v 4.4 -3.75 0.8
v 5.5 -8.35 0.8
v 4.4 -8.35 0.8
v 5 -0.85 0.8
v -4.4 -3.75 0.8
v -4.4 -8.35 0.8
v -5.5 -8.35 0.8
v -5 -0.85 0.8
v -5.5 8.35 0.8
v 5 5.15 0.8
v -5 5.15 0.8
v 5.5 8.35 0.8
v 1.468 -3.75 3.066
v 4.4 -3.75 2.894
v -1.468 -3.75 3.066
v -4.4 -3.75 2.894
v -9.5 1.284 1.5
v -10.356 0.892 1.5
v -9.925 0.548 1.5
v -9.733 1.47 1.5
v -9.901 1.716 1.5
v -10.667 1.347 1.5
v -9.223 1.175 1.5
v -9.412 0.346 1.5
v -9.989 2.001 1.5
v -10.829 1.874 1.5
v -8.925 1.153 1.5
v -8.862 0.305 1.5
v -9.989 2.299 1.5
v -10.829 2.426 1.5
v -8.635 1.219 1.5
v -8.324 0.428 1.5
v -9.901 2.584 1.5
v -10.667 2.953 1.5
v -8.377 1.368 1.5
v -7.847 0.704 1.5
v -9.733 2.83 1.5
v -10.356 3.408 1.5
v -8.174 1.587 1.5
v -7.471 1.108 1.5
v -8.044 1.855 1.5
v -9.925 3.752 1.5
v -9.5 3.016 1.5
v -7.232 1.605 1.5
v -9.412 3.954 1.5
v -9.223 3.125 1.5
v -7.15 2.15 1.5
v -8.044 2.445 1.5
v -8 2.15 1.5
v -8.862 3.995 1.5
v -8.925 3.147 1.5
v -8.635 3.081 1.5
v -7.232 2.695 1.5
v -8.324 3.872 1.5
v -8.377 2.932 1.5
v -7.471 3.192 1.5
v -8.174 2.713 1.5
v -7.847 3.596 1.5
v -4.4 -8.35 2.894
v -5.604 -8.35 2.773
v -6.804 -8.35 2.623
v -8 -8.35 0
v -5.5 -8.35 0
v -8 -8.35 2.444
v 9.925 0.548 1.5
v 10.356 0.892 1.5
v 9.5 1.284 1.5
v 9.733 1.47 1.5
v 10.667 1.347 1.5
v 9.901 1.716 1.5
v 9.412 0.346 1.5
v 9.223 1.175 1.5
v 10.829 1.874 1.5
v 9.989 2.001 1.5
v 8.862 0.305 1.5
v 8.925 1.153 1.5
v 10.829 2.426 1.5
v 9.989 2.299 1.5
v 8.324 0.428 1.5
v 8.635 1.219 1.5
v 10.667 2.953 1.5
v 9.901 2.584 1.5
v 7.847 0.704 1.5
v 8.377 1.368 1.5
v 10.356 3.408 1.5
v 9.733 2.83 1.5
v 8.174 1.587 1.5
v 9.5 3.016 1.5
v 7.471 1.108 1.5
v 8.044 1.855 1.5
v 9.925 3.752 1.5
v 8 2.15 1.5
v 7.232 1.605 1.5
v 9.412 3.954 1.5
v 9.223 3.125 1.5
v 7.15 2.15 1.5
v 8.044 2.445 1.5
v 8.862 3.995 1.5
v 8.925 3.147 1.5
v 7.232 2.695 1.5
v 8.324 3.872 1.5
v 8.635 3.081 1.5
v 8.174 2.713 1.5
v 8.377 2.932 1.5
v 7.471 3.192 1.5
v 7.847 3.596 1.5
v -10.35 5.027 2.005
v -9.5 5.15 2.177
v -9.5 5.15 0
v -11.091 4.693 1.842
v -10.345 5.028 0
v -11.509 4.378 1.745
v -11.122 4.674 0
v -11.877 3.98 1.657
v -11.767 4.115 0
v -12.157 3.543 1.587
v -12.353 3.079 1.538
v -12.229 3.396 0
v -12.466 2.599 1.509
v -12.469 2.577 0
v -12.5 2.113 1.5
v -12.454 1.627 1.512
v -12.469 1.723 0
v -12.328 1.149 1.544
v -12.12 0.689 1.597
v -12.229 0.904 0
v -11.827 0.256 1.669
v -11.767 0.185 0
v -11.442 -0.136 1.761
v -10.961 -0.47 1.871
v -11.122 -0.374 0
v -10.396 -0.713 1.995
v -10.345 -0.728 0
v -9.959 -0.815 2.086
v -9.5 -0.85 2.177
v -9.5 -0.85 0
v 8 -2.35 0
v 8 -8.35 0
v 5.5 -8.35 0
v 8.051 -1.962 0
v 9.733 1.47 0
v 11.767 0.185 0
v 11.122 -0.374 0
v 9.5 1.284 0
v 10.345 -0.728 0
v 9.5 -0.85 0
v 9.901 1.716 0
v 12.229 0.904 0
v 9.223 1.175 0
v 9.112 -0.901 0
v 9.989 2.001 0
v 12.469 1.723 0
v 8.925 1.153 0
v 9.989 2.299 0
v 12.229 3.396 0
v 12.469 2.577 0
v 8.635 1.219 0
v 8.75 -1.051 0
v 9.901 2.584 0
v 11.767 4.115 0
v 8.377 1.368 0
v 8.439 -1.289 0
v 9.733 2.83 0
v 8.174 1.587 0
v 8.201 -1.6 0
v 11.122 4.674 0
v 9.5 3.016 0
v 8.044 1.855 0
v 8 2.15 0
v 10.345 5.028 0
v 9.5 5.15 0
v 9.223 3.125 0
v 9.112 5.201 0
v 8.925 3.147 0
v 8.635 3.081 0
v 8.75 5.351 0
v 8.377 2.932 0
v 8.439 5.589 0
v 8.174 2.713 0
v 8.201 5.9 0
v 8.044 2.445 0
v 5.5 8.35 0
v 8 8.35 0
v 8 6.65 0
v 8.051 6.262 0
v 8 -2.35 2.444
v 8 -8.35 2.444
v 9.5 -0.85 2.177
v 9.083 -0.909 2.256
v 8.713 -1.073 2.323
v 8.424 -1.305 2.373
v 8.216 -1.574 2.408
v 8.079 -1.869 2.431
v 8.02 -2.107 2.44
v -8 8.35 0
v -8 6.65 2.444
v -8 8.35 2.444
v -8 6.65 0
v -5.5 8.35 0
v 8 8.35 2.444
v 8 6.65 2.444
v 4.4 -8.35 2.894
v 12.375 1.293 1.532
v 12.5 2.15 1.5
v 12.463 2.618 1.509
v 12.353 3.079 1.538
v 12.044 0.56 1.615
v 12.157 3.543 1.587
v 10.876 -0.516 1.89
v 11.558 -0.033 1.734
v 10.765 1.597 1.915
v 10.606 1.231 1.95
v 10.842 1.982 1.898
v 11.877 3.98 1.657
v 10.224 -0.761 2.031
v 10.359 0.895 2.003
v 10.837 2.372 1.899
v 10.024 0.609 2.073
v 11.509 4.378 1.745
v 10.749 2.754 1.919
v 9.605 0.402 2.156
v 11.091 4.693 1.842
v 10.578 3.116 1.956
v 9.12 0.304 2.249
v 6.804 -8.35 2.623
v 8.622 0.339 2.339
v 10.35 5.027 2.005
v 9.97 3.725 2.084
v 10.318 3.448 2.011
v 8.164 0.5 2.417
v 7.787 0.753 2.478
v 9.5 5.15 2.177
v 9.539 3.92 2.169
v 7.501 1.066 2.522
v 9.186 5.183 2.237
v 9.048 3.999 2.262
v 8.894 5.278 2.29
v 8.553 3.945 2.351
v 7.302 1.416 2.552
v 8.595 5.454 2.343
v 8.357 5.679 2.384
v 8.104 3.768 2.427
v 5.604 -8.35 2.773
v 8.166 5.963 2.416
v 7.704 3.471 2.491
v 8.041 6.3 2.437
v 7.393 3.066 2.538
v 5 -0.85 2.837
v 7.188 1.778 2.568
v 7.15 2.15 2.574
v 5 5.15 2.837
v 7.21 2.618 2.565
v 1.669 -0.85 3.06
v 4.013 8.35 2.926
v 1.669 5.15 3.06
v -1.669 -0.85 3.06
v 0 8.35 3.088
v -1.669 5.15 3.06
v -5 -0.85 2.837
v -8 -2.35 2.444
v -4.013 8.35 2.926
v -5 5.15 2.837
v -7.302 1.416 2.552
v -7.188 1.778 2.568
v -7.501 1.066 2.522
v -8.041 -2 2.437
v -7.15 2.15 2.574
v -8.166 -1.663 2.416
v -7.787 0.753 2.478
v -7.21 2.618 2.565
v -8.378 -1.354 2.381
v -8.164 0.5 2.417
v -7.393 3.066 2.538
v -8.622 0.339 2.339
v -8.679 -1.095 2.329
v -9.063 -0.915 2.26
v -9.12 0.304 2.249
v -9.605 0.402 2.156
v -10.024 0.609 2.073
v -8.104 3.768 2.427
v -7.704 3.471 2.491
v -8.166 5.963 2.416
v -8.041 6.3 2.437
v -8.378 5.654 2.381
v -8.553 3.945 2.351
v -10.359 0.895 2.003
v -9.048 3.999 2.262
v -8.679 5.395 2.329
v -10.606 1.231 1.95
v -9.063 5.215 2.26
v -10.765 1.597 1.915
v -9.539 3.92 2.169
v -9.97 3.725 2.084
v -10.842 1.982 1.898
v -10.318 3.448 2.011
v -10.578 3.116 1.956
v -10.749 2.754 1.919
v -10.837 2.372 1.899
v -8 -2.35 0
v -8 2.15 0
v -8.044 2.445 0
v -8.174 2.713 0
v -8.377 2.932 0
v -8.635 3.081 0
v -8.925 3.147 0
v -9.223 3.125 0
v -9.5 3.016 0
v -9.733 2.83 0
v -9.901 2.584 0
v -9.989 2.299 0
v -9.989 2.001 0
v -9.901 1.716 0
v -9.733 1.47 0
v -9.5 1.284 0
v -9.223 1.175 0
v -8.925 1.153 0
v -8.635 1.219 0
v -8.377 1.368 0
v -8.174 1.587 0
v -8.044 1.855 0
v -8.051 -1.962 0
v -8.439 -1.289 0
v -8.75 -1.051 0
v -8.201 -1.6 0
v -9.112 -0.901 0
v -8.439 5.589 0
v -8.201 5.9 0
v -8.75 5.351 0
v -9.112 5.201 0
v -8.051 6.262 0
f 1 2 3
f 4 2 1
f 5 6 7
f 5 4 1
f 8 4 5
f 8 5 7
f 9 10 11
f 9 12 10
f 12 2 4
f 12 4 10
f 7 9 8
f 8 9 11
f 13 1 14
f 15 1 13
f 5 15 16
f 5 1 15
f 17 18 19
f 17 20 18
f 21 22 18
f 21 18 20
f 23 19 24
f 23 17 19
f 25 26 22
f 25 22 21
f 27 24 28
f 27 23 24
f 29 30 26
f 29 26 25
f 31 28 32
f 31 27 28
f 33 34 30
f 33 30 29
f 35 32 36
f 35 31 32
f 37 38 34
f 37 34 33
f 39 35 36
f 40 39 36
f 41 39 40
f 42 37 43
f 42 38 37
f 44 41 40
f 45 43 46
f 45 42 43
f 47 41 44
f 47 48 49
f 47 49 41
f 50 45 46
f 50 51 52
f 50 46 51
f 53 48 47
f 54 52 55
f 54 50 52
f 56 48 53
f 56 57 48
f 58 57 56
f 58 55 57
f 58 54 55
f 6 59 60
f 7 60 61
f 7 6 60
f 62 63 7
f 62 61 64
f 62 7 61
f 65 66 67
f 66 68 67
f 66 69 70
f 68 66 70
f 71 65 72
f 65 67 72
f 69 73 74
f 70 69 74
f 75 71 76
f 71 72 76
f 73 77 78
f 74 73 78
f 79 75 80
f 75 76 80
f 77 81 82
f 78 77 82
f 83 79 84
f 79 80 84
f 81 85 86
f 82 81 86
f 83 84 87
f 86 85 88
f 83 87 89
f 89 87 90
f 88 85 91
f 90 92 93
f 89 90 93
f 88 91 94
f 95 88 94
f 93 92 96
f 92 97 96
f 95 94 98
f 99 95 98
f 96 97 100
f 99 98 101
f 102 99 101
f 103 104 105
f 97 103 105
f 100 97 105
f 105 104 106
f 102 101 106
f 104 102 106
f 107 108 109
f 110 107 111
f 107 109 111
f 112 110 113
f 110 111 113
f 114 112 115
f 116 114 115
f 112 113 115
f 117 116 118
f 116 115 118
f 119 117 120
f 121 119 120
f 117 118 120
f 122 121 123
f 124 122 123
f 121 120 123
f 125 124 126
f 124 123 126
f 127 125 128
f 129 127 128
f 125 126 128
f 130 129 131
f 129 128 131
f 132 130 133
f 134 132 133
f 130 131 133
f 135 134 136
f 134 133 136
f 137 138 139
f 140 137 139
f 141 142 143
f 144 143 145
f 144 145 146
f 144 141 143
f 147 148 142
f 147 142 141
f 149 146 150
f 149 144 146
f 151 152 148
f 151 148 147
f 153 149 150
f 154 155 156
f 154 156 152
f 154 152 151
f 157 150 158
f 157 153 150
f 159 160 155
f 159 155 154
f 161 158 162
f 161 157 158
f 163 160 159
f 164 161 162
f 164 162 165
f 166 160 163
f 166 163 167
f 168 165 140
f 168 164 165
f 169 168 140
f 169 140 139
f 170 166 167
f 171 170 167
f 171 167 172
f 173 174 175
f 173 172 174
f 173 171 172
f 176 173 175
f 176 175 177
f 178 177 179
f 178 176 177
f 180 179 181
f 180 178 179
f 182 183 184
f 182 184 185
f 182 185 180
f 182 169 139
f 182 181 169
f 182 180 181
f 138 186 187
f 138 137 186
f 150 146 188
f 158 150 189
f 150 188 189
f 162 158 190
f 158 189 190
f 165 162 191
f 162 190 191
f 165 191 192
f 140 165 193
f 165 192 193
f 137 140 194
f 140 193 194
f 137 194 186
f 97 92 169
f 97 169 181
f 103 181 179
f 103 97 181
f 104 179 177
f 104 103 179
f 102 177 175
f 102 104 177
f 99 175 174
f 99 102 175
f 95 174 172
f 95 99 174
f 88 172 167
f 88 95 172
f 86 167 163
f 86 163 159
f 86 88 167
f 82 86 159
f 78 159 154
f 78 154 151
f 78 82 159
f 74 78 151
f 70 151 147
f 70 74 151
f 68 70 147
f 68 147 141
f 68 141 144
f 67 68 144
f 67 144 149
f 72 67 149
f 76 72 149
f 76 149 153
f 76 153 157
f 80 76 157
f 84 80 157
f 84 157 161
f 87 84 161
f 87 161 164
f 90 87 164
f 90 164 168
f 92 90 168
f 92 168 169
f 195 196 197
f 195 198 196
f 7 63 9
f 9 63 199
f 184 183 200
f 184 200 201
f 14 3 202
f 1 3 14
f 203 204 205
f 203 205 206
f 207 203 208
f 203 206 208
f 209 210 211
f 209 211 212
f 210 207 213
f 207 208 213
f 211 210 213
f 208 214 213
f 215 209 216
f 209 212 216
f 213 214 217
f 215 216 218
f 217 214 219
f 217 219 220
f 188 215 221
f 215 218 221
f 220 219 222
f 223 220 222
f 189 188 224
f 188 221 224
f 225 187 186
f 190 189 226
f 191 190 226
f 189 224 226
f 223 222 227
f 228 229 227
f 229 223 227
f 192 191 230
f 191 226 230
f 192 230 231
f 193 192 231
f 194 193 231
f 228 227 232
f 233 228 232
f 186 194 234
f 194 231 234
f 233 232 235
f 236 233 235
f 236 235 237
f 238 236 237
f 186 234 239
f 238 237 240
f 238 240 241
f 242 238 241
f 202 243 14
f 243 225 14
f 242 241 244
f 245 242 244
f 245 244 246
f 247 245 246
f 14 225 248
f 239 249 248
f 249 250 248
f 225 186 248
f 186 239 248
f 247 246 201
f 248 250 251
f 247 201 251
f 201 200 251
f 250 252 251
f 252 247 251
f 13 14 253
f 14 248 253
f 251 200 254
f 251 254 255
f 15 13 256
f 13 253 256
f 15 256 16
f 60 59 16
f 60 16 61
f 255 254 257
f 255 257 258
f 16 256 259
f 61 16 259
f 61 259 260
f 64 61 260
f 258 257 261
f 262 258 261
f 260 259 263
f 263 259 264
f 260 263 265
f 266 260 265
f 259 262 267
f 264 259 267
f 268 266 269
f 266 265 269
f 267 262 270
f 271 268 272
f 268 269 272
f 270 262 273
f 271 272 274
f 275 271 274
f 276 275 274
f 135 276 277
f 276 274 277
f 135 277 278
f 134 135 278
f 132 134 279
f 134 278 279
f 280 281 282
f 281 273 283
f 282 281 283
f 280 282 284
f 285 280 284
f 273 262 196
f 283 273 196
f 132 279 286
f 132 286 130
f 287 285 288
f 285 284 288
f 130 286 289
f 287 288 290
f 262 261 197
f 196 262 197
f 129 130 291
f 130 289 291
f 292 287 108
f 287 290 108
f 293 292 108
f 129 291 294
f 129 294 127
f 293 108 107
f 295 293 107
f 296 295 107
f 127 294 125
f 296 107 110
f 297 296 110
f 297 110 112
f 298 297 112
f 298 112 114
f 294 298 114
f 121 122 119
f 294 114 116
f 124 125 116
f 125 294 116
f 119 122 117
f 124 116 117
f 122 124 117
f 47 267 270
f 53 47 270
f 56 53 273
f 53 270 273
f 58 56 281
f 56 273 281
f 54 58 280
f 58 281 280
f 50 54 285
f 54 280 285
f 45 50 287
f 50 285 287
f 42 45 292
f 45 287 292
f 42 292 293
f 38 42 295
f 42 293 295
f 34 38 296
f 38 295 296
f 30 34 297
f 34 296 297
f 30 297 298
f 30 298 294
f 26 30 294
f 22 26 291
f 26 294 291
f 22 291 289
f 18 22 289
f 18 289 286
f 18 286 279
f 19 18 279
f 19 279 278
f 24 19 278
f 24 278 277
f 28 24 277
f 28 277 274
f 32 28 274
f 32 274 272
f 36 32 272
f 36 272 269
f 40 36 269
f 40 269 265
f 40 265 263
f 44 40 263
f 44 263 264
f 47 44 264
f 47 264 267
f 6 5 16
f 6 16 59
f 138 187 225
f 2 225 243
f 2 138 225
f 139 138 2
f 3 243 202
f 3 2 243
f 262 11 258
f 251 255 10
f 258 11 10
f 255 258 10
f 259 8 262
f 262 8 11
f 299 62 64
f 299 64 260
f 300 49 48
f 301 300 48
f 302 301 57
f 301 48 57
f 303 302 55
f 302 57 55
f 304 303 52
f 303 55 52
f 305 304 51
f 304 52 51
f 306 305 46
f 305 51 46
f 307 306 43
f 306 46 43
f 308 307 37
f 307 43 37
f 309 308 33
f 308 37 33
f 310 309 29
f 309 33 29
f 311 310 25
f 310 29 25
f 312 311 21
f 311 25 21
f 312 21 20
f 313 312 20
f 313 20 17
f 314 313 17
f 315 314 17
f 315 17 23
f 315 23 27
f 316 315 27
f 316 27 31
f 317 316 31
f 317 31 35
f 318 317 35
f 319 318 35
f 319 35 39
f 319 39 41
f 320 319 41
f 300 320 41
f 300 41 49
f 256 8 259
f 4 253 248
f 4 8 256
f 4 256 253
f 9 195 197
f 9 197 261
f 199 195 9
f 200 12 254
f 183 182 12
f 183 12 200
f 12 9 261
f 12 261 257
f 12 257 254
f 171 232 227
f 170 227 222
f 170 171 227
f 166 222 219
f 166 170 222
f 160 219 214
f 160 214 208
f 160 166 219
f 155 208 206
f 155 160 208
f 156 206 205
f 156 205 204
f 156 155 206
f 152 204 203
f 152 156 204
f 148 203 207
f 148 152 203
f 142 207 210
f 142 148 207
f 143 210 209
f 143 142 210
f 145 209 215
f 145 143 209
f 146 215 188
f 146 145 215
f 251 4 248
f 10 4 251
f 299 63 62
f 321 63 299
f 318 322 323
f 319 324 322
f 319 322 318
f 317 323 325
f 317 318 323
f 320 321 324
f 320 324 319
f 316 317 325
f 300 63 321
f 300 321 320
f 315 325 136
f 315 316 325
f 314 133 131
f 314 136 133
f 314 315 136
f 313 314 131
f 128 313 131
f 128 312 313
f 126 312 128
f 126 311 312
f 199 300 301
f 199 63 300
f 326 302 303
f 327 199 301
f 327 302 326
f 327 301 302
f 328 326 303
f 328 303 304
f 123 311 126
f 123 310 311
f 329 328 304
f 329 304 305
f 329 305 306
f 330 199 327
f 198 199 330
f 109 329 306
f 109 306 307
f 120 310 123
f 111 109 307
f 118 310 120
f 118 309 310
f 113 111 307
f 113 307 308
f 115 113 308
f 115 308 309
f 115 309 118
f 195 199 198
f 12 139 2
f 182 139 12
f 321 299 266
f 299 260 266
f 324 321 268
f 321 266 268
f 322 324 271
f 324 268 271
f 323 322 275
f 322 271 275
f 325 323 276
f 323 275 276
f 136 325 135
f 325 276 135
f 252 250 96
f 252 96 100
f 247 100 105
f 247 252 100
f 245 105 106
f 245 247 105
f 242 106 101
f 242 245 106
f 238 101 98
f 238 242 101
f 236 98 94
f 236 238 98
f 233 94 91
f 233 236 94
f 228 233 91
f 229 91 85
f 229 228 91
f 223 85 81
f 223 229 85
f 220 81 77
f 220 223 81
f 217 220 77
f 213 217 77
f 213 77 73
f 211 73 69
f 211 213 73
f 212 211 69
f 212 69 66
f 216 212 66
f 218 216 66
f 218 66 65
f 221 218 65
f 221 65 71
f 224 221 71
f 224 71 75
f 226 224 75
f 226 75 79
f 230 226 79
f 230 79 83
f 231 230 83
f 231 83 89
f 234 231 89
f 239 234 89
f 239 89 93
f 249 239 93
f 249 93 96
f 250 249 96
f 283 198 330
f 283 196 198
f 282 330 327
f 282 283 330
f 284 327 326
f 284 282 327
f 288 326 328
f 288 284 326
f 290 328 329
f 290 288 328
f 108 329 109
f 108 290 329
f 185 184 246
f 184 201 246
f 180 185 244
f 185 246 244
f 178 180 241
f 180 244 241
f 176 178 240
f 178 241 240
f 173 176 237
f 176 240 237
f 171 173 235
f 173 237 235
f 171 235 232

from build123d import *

# Parameters (mm, degrees)
MAIN_DEPTH               = 5.1
SKETCH1_W                = 10
SKETCH1_H                = 6
SENSOR_CUT_DEPTH         = 5.1
MOUNTING_EARS_DEPTH      = 3
SKETCH4_R                = 1
MOUNT_HOLES_DEPTH        = 3
SKETCH9_R                = 1.85
CUT_EXTRUDE1_DEPTH       = 1.5
CIRCULAR_FRONT_CUT_REACH = 23.474
SKETCH6_W                = 11
SKETCH6_H                = 16.7
PCB_CUT_DEPTH            = 0.8
FILLET3_R                = 1.5


with BuildPart() as part:
    # Sketch2 → main (new body)
    with BuildSketch(Plane.XY):
        Polygon((-4.4, -8.35), (-8, -8.35), (-8, 8.35), (8, 8.35), (8, -8.35), (4.4, -8.35), (4.4, -3.75), (-4.4, -3.75), align=None)
    extrude(amount=MAIN_DEPTH)

    # Sketch1 → sensor_cut (cut)
    with BuildSketch(Plane.XY):
        with Locations((0, 2.15)):
            Rectangle(SKETCH1_W, SKETCH1_H)
    extrude(amount=SENSOR_CUT_DEPTH, mode=Mode.SUBTRACT)

    # Sketch3 → mounting_ears (add)
    with BuildSketch(Plane(origin=(0, 0, 0), x_dir=(-1, 0, 0), z_dir=(0, 0, -1))):
        with BuildLine():
            Line((9.5, -0.85), (8, -0.85))
            Line((8, -0.85), (8, 5.15))
            Line((8, 5.15), (9.5, 5.15))
            ThreePointArc((9.5, 5.15), (12.5, 2.15), (9.5, -0.85))
        make_face()
        with BuildLine():
            Line((-8, 5.15), (-9.5, 5.15))
            ThreePointArc((-9.5, 5.15), (-12.5, 2.15), (-9.5, -0.85))
            Line((-9.5, -0.85), (-8, -0.85))
            Line((-8, -0.85), (-8, 5.15))
        make_face()
    extrude(amount=-MOUNTING_EARS_DEPTH)

    # Sketch4 → mount_holes (cut)
    with BuildSketch(Plane.XY.offset(3)):
        with Locations((-9, 2.15)):
            Circle(SKETCH4_R)
    mount_holes = extrude(amount=-MOUNT_HOLES_DEPTH, mode=Mode.SUBTRACT)

    # Sketch9 → Cut-Extrude1 (cut)
    with BuildSketch(Plane.XY.offset(3)):
        with Locations((-9, 2.15)):
            Circle(SKETCH9_R)
    cut_extrude1 = extrude(amount=-CUT_EXTRUDE1_DEPTH, mode=Mode.SUBTRACT)

    # Mirror1: mount_holes, Cut-Extrude1 across plane
    add(mount_holes.mirror(Plane(origin=(0, 0, 0), x_dir=(0, 0, 1), z_dir=(1, 0, 0))), mode=Mode.SUBTRACT)
    add(cut_extrude1.mirror(Plane(origin=(0, 0, 0), x_dir=(0, 0, 1), z_dir=(1, 0, 0))), mode=Mode.SUBTRACT)

    # circular_front_cut: up to this face of the body (flat: up to its plane)
    circular_front_cut_end = Plane(part.part.faces().sort_by_distance((-6.2, -8.35, 2.55))[0])
    # Sketch5 → circular_front_cut (cut, up to the picked face)
    with BuildSketch(Plane(origin=(0, 8.35, 0), x_dir=(1, 0, 0), z_dir=(0, 1, 0)), mode=Mode.PRIVATE) as circular_front_cut_sk1:
        with BuildLine():
            Line((-12.5, -1.5), (-12.5, -9.92320486))
            Line((-12.5, -9.92320486), (12.5, -9.92320486))
            Line((12.5, -9.92320486), (12.5, -1.5))
            ThreePointArc((12.5, -1.5), (0, -3.087708172), (-12.5, -1.5))
        make_face()
    circular_front_cut_tool1 = split(extrude(circular_front_cut_sk1.sketch, amount=-CIRCULAR_FRONT_CUT_REACH, mode=Mode.PRIVATE), bisect_by=circular_front_cut_end, keep=Keep.BOTH, mode=Mode.PRIVATE)
    add(circular_front_cut_tool1.solids().sort_by(Axis((0, 8.35, 6.227394), (0, -1, 0)))[0], mode=Mode.SUBTRACT)

    # Sketch6 → pcb_cut (cut)
    with BuildSketch(Plane(origin=(0, 0, 0), x_dir=(-1, 0, 0), z_dir=(0, 0, -1))):
        Rectangle(SKETCH6_W, SKETCH6_H)
    extrude(amount=-PCB_CUT_DEPTH, mode=Mode.SUBTRACT)

    # Fillet3
    fillet3_edges = [part.edges().sort_by_distance(p)[0] for p in [
        (-8, -0.85, 1.221779445),
        (-8, 5.15, 1.221779445),
        (8, 5.15, 1.221779445),
        (8, -0.85, 1.221779445),
    ]]
    fillet(fillet3_edges, radius=FILLET3_R - 0.0001)  # a hair under: the kernel refuses the full size


solid = part.part
